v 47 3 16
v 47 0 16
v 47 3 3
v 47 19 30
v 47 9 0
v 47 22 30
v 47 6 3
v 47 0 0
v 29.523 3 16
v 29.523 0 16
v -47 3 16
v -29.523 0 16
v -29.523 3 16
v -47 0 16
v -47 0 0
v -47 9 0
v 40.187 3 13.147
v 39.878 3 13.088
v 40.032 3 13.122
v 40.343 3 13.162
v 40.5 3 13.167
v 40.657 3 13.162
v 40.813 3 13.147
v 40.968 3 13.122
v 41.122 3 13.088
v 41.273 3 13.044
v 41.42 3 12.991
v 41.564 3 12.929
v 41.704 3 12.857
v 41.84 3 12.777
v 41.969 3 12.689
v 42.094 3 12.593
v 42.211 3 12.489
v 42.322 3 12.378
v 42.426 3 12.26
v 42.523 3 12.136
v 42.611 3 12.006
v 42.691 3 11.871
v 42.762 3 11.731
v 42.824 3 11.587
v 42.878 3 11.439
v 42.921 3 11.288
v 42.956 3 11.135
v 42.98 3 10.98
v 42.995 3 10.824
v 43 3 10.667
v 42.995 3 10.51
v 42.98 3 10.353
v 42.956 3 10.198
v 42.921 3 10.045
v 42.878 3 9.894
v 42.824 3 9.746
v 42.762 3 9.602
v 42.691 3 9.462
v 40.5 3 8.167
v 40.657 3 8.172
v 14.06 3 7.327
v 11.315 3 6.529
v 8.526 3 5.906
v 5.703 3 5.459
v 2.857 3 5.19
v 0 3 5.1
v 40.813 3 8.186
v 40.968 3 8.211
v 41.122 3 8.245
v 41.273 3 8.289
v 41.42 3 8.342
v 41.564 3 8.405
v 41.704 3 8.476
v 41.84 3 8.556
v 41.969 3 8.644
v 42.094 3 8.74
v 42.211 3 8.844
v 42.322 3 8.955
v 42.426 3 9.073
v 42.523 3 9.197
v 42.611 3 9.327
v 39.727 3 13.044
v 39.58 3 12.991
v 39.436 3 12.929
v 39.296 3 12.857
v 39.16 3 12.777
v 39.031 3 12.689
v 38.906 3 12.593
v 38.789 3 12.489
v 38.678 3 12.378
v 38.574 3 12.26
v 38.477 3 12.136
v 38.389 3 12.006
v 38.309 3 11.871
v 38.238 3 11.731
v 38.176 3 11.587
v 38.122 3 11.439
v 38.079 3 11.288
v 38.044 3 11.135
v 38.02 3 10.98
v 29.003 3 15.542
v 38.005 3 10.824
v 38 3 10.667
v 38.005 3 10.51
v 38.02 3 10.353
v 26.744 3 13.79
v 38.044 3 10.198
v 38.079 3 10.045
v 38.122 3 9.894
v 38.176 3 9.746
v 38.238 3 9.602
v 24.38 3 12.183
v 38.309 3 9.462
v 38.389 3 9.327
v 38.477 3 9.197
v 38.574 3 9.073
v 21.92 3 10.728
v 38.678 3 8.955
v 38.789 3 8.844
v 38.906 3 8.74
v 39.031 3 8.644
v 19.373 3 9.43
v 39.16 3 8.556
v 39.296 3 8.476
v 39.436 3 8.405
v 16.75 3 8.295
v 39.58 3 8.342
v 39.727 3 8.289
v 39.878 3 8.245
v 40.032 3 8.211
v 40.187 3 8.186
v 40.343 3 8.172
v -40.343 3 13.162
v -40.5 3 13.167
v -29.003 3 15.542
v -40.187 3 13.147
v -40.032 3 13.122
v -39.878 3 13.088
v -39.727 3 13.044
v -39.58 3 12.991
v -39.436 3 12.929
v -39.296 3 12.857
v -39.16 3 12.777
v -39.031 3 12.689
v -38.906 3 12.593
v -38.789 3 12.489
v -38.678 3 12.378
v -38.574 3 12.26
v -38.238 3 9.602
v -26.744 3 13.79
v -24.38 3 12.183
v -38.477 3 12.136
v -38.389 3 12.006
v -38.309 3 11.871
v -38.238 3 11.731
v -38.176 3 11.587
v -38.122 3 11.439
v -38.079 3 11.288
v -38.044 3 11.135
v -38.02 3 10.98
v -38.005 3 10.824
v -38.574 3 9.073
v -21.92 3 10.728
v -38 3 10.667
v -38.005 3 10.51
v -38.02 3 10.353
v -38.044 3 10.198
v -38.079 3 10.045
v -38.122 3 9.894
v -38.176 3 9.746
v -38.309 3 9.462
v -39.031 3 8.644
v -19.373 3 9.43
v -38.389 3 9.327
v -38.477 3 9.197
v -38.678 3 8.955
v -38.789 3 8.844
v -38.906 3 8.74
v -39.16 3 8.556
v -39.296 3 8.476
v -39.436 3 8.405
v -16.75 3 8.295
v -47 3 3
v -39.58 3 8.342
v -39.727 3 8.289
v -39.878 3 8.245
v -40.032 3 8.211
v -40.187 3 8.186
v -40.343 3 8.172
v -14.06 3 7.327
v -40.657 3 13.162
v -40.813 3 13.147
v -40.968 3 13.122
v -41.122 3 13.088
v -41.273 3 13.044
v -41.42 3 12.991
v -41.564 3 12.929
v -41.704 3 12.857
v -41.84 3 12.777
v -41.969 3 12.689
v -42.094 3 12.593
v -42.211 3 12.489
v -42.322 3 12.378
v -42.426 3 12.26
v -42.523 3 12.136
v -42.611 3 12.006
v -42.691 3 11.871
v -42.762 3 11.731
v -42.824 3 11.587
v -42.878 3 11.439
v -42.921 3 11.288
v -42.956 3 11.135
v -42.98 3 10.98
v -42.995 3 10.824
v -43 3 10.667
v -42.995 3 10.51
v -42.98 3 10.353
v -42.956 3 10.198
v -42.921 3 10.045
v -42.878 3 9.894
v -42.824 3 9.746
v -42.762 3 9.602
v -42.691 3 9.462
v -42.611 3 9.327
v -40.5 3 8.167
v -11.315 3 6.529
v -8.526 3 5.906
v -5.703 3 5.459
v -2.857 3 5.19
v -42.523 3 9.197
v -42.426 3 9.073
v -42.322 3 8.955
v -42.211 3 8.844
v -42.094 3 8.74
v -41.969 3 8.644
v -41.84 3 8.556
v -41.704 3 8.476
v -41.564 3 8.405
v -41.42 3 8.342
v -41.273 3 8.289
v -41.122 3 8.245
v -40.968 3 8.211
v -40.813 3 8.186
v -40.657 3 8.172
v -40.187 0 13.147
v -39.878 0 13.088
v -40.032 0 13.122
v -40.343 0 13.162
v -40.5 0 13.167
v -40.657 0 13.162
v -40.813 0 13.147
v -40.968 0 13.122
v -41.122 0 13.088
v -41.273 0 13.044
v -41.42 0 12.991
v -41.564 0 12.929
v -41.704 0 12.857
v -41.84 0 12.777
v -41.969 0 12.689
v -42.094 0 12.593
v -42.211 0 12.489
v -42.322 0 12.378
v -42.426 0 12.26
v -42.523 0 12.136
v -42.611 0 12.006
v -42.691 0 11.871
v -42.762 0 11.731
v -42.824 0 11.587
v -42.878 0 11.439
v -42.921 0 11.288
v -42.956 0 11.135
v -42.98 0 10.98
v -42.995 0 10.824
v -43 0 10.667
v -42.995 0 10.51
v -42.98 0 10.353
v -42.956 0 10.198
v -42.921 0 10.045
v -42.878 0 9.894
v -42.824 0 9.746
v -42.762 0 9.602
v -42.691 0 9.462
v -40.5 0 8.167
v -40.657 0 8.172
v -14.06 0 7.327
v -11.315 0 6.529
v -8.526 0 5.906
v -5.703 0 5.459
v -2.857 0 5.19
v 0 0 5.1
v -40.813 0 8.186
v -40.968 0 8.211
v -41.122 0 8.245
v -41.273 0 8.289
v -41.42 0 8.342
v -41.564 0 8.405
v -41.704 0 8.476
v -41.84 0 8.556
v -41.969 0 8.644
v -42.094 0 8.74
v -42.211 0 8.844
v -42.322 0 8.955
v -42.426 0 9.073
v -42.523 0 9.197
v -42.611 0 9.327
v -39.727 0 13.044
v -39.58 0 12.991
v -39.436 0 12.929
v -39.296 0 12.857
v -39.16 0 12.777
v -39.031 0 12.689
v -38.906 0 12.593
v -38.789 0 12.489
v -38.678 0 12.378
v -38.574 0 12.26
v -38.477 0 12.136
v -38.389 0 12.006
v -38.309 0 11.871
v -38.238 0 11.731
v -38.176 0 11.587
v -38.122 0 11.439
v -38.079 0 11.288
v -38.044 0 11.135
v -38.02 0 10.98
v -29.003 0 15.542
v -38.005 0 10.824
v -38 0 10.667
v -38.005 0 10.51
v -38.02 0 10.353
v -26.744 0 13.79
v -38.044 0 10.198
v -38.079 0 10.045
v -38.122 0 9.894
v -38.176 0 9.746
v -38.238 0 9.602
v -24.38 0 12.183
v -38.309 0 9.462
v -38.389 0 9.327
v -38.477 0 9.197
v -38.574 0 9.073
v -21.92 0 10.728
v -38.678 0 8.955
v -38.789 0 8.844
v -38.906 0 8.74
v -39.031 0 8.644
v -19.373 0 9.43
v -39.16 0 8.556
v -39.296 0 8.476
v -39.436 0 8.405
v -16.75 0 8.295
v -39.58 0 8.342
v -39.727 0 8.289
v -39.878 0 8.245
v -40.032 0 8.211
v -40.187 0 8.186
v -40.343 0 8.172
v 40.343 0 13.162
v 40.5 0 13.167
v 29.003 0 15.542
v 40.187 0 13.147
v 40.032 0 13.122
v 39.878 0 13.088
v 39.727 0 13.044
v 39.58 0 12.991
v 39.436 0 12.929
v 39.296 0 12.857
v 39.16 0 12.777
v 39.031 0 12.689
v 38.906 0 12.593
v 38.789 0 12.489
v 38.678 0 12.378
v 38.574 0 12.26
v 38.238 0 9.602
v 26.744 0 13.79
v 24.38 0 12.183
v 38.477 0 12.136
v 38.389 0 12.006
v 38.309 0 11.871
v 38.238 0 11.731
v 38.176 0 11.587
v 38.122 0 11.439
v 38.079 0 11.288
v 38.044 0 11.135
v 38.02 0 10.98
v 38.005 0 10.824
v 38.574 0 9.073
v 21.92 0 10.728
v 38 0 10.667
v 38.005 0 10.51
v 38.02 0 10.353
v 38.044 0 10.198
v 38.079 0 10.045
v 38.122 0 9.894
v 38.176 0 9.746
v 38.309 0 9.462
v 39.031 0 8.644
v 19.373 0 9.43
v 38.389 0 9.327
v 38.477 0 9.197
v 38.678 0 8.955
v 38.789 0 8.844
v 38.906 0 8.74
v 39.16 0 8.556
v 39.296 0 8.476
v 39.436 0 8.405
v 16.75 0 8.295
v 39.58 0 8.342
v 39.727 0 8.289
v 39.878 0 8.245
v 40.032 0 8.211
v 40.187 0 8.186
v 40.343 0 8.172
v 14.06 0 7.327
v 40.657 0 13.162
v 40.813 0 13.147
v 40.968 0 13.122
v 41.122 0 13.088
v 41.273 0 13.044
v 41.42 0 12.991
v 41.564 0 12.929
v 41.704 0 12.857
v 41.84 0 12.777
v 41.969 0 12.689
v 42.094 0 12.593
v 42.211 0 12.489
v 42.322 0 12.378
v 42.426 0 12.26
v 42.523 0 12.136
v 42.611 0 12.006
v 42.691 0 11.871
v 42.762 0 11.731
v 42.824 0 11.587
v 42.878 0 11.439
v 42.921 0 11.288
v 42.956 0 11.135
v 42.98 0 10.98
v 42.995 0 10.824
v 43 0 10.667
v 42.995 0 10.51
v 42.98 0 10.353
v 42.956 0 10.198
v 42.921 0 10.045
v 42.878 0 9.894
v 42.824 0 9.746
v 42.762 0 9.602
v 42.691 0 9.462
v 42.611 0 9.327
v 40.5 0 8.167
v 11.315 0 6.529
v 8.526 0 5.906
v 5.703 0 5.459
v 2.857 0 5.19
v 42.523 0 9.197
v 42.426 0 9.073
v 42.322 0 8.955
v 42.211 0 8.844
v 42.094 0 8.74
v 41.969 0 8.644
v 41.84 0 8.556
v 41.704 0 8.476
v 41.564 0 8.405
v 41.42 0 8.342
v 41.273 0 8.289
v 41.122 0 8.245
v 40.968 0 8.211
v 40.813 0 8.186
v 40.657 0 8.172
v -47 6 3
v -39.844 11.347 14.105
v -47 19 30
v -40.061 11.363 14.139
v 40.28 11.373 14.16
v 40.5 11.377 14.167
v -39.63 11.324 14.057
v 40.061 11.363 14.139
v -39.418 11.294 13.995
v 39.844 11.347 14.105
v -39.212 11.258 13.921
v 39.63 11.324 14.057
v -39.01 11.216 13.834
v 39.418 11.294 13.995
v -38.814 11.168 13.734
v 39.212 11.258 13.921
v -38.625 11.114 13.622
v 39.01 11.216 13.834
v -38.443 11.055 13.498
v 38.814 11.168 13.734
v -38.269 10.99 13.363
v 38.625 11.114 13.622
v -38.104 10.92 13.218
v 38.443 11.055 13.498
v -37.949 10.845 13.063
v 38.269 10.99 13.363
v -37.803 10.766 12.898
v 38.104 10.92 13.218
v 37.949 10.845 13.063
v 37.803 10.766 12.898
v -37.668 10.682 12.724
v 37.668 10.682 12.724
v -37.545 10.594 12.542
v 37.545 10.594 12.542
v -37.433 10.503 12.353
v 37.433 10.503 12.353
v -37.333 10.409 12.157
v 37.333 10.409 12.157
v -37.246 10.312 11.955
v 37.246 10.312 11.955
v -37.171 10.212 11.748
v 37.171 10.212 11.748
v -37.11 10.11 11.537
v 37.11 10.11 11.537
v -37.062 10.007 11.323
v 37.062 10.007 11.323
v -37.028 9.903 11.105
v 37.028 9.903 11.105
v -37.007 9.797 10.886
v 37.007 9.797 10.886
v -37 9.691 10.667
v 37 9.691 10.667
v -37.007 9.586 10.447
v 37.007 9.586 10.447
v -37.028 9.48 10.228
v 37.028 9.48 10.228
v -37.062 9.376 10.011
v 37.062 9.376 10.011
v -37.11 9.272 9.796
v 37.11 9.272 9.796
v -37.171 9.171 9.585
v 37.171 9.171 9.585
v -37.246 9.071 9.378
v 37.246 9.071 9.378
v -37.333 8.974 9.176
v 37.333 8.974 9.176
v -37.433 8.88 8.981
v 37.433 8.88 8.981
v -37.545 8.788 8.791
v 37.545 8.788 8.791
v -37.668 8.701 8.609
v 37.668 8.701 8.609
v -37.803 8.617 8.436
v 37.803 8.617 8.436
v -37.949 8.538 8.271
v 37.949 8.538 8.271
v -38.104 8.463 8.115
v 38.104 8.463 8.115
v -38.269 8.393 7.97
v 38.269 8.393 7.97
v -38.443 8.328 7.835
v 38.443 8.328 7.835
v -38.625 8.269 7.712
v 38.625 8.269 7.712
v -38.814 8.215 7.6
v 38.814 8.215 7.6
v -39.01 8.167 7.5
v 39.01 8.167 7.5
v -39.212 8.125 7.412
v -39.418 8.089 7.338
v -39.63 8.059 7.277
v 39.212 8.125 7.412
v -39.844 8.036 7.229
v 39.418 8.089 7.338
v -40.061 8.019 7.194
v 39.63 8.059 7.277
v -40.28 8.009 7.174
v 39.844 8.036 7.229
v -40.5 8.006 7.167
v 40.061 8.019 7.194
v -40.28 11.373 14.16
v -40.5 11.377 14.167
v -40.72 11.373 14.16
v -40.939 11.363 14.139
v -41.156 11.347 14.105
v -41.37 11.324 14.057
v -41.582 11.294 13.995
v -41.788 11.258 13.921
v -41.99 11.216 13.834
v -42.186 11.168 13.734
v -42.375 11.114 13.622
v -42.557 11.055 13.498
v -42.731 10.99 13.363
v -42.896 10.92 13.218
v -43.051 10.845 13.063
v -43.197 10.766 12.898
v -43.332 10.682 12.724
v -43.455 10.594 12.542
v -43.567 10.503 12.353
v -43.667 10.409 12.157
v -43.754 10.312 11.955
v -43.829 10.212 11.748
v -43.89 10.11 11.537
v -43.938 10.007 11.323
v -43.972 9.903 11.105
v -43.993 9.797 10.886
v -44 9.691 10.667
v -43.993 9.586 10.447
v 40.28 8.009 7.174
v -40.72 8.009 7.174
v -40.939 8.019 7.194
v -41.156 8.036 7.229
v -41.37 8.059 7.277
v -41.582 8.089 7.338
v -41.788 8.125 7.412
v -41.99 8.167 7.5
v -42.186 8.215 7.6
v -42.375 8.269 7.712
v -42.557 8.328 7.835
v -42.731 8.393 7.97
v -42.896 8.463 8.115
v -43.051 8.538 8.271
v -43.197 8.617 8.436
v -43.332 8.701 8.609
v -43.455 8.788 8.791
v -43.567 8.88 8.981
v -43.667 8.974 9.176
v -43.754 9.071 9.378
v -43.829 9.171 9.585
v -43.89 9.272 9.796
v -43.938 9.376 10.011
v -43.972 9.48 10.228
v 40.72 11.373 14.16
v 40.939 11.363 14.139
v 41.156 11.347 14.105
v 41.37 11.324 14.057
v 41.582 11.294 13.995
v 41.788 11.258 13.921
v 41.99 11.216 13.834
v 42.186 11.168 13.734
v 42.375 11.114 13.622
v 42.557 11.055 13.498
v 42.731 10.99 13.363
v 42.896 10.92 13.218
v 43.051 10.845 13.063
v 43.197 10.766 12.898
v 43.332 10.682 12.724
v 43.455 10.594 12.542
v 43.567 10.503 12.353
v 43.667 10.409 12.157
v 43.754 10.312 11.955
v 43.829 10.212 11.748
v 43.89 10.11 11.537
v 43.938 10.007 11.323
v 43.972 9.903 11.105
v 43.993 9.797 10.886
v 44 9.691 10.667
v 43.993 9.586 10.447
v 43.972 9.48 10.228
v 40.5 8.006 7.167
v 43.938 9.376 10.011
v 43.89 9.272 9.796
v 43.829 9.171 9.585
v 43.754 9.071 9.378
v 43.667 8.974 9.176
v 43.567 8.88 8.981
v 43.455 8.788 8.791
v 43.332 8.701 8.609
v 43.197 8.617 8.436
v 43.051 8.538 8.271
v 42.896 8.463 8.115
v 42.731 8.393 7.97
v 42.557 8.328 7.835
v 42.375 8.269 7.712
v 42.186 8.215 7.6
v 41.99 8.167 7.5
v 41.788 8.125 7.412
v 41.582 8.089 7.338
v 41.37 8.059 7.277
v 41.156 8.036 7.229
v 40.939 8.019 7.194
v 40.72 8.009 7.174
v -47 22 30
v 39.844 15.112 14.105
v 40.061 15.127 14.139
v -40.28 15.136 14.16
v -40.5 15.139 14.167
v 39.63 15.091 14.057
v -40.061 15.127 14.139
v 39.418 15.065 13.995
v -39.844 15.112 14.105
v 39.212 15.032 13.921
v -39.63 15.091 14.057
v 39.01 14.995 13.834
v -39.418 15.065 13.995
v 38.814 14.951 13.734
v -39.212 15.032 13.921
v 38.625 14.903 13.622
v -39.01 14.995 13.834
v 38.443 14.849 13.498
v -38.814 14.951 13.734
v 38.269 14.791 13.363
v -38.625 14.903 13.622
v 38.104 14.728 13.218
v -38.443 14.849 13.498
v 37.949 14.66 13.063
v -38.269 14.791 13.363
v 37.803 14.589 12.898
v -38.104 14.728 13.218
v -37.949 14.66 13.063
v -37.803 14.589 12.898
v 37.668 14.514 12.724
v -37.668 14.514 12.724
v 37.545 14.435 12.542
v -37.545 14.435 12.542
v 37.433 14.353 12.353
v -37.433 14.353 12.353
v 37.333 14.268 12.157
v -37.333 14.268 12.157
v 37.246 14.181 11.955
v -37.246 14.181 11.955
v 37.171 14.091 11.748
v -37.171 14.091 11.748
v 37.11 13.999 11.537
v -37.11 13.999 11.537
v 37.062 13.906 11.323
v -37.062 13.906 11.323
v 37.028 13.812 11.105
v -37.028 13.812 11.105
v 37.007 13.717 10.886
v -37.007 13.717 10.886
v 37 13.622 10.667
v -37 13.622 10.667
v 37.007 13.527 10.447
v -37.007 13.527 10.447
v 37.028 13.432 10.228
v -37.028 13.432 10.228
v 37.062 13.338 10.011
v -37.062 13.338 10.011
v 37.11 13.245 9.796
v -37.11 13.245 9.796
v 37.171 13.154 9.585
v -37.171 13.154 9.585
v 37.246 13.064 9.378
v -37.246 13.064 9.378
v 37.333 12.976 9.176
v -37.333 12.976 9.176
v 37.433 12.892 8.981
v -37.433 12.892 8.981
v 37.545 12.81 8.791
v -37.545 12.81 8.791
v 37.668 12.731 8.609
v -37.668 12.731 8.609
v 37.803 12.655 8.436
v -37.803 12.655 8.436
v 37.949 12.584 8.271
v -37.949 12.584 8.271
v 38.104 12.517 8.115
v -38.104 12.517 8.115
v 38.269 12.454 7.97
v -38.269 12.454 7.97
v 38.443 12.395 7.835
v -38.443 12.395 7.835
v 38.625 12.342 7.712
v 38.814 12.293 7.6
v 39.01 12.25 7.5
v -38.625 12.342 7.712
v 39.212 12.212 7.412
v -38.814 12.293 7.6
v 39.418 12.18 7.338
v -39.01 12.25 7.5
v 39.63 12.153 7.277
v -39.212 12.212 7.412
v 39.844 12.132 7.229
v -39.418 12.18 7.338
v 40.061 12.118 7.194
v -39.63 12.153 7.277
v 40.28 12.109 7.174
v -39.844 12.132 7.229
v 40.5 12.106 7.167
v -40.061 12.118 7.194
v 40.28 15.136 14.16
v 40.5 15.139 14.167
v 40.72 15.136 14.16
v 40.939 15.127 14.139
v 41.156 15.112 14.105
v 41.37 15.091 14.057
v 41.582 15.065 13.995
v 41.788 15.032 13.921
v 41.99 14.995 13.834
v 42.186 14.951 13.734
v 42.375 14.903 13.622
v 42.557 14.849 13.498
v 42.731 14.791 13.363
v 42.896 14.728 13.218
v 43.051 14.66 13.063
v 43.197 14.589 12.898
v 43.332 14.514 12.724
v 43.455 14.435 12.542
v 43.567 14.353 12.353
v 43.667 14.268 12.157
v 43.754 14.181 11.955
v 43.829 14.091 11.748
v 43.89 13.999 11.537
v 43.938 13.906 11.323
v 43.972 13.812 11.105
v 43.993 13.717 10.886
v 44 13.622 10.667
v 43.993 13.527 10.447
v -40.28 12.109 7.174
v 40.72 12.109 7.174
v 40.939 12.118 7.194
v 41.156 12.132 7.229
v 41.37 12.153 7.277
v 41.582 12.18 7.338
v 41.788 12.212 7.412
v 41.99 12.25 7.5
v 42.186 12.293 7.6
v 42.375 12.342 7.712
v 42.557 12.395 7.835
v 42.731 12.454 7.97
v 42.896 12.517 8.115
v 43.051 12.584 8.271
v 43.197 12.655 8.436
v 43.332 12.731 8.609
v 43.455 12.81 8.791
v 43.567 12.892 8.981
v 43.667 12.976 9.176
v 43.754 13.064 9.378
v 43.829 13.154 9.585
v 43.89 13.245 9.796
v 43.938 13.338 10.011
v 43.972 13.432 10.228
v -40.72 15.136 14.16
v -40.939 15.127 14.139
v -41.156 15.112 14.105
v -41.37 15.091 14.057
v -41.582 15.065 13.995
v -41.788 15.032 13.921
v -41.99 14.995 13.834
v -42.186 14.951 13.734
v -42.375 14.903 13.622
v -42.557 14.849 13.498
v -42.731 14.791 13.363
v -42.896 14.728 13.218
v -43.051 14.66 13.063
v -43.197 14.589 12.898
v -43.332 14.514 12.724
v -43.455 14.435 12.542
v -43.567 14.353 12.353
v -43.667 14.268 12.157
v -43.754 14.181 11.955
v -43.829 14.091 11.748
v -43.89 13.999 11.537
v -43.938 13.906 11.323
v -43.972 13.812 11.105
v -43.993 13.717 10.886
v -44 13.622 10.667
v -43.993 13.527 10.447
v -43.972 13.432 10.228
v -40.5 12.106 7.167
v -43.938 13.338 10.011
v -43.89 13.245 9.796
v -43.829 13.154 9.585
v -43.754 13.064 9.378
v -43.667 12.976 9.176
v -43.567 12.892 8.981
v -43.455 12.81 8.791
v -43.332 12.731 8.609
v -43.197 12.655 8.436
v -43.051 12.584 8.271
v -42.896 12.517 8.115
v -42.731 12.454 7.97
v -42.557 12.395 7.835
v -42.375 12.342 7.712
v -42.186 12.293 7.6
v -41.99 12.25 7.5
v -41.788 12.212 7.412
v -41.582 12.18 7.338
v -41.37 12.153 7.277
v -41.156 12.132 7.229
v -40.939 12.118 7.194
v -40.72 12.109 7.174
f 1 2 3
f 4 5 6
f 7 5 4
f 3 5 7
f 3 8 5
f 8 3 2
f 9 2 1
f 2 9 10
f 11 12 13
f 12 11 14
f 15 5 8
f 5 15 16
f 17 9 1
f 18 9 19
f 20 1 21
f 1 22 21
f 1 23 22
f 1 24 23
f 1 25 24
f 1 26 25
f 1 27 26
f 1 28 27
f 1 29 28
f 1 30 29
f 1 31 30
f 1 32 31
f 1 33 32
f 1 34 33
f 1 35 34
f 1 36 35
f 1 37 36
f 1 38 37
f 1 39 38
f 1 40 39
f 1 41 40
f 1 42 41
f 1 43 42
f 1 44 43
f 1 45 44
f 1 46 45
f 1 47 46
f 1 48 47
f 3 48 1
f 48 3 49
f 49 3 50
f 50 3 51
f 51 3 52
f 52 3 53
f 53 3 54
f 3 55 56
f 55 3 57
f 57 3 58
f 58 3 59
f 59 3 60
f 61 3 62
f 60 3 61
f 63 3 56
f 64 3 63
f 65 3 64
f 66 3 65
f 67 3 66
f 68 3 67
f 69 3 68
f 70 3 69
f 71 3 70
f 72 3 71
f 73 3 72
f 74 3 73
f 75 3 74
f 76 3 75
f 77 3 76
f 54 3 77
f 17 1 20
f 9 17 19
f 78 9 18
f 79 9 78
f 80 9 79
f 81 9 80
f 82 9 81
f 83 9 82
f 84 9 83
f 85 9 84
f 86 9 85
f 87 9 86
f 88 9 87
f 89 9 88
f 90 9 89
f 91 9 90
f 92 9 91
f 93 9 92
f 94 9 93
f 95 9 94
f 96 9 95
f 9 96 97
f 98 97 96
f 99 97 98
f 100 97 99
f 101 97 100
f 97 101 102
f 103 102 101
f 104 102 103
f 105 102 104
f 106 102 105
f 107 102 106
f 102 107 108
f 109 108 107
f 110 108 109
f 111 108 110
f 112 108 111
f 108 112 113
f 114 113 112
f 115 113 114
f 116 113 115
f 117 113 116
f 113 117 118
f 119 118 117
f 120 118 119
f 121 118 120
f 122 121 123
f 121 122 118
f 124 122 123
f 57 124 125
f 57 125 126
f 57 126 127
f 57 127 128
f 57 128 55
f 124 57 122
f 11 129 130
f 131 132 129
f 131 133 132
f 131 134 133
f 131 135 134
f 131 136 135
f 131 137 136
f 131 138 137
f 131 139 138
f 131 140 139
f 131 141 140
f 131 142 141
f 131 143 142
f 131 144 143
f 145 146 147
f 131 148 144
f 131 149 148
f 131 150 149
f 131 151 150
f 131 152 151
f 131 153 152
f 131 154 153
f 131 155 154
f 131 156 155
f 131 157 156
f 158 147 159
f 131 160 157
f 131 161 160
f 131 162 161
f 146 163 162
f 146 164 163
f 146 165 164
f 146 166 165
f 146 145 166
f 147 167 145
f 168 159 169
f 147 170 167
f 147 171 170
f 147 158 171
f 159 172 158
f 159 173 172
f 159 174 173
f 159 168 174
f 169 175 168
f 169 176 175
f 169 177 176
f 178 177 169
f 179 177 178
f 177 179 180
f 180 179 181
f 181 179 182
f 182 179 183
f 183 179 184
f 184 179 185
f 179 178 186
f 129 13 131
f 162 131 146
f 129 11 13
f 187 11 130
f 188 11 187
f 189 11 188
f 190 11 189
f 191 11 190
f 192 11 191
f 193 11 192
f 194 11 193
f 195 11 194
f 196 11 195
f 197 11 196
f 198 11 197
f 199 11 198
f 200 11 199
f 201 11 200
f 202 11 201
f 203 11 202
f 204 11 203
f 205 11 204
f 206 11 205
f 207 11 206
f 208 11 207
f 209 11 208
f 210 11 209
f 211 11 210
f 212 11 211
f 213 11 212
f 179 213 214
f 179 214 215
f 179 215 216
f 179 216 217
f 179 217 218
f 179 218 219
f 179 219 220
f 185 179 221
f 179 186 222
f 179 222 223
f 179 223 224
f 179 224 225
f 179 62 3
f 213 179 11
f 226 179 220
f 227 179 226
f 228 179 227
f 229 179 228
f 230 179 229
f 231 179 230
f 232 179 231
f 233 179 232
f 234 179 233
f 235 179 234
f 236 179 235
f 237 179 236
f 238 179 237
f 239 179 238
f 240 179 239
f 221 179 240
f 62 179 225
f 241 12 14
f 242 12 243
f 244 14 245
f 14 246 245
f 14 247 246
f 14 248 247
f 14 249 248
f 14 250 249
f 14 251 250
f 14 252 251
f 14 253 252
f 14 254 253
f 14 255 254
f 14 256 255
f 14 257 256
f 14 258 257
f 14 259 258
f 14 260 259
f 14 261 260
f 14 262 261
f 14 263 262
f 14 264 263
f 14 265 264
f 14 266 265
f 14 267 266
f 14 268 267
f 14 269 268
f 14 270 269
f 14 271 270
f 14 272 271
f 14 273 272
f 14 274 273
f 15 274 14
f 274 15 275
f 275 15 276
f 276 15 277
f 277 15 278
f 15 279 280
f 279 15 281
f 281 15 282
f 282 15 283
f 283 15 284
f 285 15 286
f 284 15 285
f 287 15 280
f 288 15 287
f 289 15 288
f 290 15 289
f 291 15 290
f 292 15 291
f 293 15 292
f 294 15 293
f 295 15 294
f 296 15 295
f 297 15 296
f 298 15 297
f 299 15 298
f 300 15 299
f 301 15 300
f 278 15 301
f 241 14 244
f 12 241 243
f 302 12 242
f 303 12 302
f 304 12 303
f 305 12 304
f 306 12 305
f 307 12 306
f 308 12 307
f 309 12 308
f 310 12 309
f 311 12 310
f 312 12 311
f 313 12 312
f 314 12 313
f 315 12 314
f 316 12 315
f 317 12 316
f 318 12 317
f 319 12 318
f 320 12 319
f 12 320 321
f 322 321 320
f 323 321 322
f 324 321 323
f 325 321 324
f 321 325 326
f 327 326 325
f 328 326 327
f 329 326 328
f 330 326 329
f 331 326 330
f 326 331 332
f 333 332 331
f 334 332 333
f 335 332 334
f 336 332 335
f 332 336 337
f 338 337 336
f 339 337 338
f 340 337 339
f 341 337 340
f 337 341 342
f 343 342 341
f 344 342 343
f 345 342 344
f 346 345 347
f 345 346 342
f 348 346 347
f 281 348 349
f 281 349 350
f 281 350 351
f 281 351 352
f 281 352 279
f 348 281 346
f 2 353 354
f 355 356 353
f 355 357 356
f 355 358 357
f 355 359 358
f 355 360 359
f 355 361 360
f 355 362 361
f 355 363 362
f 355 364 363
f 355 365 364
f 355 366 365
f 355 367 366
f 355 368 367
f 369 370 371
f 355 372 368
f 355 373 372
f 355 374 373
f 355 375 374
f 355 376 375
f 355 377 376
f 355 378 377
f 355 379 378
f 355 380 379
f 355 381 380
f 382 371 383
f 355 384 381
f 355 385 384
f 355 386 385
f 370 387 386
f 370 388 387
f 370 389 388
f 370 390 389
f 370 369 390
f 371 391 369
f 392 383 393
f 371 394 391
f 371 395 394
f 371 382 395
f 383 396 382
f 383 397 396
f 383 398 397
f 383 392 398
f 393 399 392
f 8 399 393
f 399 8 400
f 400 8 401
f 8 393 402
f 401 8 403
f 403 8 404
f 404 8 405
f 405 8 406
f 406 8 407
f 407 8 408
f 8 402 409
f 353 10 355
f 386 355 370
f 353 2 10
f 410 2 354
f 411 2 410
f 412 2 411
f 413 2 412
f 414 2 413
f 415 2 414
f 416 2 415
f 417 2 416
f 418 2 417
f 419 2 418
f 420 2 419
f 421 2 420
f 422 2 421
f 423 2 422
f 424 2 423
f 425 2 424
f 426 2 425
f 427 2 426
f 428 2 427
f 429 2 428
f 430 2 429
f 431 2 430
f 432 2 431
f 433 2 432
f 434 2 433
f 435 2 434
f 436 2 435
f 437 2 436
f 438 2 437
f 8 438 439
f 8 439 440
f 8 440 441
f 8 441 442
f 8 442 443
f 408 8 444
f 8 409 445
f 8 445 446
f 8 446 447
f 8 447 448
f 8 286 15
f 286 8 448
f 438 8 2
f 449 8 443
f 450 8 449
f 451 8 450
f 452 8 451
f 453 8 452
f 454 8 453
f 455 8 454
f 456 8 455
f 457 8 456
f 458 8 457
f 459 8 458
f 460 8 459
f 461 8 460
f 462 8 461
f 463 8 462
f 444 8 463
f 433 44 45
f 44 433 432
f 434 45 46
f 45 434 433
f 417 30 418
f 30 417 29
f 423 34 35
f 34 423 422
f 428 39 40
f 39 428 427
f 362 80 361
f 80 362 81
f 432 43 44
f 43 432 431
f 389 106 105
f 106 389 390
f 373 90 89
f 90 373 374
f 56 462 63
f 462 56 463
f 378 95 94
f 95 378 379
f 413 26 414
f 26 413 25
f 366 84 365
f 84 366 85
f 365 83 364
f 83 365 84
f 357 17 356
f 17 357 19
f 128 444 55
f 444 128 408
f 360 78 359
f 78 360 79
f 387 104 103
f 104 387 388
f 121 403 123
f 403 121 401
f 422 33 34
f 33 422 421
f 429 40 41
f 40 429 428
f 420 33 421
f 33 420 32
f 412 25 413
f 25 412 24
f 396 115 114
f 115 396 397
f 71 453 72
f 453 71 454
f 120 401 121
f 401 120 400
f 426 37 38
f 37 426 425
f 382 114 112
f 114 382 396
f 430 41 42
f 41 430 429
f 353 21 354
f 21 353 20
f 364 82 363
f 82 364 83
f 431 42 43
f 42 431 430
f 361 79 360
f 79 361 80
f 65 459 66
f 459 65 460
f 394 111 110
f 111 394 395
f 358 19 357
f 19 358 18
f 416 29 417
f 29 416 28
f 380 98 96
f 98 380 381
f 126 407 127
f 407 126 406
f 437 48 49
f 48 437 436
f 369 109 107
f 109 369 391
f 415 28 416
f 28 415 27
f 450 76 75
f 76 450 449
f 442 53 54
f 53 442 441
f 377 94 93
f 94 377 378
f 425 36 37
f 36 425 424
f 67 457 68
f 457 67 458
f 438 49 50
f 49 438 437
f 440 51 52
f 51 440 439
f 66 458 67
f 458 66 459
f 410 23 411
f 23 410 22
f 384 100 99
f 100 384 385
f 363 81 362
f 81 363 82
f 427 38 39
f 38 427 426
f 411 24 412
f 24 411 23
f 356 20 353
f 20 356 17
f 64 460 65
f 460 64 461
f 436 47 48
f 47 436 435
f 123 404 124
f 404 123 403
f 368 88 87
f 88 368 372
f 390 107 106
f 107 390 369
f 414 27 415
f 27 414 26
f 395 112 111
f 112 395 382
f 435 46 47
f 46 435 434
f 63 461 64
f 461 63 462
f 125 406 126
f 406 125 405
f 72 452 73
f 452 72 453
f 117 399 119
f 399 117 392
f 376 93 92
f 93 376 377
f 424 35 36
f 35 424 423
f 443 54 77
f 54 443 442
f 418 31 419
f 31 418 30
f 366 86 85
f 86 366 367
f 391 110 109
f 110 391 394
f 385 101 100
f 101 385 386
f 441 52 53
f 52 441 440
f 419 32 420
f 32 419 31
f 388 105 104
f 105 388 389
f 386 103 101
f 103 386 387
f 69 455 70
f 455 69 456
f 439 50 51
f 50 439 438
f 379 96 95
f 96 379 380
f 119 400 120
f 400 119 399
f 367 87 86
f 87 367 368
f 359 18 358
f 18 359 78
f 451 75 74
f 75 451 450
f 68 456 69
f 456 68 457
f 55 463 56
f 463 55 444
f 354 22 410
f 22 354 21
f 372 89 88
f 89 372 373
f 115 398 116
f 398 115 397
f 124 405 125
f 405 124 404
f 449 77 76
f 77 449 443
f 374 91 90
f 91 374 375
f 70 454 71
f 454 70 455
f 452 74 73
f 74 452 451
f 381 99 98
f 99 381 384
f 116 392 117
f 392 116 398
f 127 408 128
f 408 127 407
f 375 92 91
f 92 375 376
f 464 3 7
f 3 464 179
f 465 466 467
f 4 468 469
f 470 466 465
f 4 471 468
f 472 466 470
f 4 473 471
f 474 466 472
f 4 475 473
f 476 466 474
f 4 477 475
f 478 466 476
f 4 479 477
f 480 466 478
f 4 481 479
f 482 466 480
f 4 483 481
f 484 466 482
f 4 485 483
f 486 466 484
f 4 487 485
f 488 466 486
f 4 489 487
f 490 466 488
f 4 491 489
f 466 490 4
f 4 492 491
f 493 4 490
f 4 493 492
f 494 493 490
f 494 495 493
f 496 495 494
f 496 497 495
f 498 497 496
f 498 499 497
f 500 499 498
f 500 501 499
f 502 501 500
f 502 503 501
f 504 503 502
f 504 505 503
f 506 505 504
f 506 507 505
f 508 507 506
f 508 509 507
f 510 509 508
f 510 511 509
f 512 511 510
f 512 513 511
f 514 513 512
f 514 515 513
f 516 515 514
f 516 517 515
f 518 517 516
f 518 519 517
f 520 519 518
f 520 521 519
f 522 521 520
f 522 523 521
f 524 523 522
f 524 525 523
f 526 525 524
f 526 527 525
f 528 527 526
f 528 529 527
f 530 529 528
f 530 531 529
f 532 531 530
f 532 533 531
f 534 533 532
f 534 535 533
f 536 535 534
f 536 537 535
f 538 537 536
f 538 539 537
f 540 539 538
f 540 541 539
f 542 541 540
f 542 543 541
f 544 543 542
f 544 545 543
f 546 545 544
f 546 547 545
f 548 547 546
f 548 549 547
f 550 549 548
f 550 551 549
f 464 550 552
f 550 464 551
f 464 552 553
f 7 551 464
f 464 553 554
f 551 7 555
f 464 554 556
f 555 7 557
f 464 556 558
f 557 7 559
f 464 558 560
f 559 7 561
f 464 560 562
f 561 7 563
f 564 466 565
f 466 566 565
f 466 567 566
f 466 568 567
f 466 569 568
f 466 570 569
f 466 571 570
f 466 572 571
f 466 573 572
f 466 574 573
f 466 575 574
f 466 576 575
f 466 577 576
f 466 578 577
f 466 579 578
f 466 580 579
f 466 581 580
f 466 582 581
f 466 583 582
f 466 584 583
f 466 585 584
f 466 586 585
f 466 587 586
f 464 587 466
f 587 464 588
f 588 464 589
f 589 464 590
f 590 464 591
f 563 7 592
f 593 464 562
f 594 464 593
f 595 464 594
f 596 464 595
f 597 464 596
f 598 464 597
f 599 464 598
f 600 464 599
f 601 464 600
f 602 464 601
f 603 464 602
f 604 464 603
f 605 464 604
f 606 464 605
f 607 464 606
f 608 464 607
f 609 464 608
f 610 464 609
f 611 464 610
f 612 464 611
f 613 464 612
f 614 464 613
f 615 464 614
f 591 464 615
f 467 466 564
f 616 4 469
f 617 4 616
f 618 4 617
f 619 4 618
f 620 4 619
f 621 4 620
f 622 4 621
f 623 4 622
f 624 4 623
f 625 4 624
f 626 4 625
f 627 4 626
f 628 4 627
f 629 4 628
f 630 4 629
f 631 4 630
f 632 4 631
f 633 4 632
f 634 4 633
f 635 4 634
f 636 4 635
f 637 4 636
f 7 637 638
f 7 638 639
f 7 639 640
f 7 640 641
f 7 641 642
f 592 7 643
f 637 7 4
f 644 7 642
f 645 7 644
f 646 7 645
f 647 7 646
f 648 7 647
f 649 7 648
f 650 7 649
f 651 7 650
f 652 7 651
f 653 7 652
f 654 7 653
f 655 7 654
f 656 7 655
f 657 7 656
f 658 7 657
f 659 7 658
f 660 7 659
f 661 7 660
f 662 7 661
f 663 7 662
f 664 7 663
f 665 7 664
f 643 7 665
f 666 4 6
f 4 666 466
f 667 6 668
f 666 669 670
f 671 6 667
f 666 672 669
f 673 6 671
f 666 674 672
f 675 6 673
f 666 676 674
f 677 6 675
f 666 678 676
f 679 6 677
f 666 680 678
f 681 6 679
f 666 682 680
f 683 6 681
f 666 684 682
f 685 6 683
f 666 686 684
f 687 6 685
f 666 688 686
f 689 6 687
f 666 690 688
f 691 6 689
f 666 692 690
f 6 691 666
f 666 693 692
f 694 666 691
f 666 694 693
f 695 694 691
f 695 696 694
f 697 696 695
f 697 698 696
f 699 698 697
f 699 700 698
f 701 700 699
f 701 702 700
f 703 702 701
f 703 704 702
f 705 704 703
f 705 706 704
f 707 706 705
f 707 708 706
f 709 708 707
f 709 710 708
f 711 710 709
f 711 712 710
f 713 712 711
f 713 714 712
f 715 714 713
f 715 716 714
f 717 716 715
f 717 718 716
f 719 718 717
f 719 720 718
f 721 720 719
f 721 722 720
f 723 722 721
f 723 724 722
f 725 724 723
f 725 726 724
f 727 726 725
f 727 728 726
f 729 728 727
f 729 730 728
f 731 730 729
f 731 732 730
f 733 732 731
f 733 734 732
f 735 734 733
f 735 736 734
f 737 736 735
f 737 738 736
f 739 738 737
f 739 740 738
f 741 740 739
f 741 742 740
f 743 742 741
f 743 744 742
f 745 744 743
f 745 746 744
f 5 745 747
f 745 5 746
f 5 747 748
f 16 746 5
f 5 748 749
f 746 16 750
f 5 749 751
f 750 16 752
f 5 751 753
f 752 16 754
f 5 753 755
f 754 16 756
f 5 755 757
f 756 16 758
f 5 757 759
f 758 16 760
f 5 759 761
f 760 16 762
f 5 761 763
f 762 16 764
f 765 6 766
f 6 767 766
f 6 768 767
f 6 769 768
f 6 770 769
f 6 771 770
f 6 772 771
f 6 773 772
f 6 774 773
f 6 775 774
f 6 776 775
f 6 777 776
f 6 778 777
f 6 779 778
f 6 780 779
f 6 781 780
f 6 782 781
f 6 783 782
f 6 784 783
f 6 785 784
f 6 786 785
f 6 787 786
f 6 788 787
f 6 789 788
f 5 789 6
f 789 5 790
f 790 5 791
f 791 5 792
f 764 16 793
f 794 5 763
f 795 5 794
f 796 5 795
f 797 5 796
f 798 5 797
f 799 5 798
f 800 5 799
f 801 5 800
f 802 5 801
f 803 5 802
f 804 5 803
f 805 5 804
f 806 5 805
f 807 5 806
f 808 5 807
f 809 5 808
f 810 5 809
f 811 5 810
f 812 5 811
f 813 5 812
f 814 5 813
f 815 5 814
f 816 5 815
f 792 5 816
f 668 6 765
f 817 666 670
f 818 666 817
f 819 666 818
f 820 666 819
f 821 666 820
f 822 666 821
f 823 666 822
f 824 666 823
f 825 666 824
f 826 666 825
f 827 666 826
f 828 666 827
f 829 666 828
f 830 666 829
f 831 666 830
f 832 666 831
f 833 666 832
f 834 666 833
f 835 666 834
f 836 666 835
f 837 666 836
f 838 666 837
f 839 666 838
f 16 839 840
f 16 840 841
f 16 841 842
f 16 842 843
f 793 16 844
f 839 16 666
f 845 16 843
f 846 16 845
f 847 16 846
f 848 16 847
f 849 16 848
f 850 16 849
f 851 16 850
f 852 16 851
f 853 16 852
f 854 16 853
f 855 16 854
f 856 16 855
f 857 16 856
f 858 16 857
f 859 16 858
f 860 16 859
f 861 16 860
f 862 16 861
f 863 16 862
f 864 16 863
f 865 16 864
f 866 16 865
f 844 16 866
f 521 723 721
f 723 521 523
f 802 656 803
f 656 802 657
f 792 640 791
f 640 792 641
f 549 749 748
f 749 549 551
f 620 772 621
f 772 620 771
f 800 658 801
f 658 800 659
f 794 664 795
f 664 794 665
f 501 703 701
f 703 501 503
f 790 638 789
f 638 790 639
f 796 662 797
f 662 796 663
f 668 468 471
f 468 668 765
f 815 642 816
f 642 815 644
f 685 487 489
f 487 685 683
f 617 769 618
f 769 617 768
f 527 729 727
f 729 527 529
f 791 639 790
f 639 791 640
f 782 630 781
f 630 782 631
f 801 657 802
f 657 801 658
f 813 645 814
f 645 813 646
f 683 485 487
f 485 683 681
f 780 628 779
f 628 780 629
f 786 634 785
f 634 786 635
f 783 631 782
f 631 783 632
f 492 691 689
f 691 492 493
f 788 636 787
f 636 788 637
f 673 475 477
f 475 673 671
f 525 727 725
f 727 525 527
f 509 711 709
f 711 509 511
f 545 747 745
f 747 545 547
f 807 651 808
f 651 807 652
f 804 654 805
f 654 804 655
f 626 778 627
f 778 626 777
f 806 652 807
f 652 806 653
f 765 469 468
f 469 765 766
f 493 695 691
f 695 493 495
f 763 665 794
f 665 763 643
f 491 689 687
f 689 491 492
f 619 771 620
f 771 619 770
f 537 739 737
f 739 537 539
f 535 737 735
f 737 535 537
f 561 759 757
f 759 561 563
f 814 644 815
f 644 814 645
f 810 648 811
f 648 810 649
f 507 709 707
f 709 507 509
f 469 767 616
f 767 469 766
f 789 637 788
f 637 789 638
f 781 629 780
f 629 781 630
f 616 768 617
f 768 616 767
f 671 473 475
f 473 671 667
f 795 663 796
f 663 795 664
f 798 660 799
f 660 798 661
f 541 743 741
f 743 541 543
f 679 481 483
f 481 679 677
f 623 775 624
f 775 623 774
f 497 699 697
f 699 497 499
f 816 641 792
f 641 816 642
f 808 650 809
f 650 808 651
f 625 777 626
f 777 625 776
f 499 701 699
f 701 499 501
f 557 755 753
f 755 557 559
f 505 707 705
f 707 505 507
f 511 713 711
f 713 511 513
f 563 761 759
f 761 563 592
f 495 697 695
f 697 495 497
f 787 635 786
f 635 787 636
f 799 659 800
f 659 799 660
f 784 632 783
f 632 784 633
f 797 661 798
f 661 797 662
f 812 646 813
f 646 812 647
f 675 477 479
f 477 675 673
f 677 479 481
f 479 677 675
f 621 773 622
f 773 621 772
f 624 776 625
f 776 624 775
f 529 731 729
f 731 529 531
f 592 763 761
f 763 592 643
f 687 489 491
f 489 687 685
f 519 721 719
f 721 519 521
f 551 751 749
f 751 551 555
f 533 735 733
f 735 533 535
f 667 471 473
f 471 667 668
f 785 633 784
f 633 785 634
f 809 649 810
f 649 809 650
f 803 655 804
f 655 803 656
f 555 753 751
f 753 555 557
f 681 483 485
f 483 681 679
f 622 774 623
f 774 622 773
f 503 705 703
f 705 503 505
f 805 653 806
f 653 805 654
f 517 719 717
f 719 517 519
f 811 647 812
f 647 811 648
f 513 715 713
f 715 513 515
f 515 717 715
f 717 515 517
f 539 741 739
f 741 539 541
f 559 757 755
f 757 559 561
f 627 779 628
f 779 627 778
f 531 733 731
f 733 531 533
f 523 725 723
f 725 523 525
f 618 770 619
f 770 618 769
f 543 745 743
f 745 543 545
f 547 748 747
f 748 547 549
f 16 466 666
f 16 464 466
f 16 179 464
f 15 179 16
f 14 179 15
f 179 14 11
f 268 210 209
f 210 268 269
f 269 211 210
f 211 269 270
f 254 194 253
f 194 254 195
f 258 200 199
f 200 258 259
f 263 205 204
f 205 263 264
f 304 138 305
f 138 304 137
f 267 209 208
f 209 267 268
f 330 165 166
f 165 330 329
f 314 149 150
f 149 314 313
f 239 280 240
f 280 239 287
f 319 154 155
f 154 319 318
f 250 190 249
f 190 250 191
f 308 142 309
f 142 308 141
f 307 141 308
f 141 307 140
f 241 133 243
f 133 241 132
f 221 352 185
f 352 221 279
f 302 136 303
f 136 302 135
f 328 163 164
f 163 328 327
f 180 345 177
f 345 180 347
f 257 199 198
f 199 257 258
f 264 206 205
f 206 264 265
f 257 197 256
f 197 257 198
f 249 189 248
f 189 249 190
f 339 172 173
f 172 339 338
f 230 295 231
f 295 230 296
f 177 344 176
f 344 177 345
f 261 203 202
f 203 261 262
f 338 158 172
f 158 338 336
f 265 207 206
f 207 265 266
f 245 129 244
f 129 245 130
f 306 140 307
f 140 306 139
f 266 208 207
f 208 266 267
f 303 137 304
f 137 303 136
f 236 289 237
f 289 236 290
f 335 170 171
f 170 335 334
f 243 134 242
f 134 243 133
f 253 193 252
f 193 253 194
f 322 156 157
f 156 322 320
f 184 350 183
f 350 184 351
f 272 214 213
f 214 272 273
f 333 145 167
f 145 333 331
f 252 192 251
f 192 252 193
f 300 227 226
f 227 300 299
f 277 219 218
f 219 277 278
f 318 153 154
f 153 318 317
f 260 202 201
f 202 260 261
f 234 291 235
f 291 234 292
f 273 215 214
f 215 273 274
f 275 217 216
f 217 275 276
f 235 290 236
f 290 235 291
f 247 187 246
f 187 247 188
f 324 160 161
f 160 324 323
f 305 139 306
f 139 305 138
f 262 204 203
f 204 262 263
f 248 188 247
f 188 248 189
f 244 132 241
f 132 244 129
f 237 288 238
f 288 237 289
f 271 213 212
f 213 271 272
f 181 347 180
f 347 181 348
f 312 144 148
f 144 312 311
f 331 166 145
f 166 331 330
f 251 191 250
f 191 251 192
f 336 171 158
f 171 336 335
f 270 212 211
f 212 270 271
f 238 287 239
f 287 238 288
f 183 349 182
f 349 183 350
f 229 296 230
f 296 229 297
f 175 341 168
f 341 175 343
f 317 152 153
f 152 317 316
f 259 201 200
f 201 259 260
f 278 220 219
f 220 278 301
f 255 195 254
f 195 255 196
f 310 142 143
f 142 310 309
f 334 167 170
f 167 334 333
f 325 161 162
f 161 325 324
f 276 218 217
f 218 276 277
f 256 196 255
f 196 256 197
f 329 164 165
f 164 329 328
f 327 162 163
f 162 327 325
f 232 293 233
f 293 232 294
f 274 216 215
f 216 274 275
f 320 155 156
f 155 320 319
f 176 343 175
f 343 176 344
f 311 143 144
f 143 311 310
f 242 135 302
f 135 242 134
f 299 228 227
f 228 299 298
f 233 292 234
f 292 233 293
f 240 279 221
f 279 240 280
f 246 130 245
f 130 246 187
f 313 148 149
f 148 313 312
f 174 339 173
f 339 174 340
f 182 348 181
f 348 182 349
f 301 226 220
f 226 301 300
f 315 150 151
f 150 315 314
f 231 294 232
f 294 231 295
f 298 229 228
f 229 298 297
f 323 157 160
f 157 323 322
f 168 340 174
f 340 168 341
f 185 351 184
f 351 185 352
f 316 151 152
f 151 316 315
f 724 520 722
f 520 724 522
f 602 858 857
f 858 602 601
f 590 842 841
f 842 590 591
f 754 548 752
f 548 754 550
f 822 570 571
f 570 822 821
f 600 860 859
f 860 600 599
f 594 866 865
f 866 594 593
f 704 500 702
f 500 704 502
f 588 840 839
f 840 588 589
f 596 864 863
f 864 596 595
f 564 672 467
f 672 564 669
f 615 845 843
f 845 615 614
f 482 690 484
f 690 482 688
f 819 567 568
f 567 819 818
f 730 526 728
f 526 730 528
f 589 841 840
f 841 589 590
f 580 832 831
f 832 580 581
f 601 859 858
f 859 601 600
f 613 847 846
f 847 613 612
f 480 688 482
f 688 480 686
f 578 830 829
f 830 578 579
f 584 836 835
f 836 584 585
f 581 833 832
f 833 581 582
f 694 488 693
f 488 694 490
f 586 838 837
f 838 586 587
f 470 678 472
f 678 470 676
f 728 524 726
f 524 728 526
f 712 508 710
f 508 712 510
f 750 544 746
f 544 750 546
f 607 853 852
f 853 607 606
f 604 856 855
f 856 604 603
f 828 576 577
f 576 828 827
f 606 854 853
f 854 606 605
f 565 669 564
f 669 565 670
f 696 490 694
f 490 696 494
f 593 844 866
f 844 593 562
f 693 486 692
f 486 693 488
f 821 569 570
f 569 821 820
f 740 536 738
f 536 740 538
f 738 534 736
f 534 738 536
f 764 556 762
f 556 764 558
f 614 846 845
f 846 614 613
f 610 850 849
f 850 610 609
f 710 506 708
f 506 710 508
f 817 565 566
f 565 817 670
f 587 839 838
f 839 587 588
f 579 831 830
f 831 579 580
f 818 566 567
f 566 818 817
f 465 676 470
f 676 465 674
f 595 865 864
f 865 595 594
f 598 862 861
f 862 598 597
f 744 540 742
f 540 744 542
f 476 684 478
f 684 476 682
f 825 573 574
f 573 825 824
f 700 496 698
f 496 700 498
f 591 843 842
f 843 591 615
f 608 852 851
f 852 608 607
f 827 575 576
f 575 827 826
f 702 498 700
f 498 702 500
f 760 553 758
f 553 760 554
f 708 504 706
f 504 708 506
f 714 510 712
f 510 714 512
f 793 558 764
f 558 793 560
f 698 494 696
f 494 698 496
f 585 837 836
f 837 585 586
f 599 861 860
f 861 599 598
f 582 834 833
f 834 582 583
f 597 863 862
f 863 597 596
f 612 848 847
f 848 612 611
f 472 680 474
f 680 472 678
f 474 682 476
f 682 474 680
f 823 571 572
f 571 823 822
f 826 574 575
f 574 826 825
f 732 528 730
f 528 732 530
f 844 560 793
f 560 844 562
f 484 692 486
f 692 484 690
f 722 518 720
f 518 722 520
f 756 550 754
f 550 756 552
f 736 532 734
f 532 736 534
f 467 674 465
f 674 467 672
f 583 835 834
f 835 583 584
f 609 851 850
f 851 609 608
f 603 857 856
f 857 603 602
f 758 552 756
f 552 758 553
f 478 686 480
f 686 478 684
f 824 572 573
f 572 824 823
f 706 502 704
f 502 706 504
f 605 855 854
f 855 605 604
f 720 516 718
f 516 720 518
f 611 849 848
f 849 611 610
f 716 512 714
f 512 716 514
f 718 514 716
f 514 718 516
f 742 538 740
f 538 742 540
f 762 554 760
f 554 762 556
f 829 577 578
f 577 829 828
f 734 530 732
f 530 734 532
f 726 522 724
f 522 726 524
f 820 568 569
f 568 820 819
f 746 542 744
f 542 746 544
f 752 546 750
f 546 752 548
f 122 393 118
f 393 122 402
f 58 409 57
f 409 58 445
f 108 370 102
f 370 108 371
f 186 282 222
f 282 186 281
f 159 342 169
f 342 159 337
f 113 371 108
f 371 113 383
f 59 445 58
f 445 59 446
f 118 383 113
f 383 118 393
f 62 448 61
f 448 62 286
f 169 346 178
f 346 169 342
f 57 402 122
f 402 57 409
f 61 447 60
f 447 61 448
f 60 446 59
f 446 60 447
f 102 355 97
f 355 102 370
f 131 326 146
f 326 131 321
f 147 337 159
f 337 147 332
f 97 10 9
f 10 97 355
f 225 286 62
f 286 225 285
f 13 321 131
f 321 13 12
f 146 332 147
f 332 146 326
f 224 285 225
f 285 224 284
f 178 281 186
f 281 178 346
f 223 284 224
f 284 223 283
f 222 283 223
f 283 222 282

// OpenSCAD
// [FL_INDEX: keywords="openscad, 3d_parametric, Configurable_fan_mounted_air_deflector, csg_solid" | COT="Parametric OpenSCAD design from 3DCodeverse"]
// Title: Configurable fan mounted air deflector

// Thickness of part surfaces. 3mm will give a robust part.
thickness = 3;
// Distance in mm that fin will go away from the fan.
fin_height = 22;
// Distance in mm between tilt section and mounting section.
spacer = 3;
// Distance into the fan that the fin tilts inward towards the fan.
fin_tilt = 30; // [0:50]
// The center-to-center distance between fan mounting holes, used for sizing the fan mount plate.
fan_mounting_hole_seperation = 81;
// Size of hole for the chassis mount screw.
fan_screw_hole_diameter = 5;
// Diameter in mm of your screw or screwdriver, whichever is larger. Or zero if you can mount from the other side.
access_hole_diameter = 7;

module fan_stand(thickness, space, height, tilt, fan_hole_sep)
{
	// Calculate sizes of parts (some calculations are done below).
	fan_dia = fan_mounting_hole_seperation + 2*fan_screw_hole_diameter;
	// These two are overridden below because OpenSCAD can't assign
	// values inside conditionals.
	mount_width = 2 * fan_screw_hole_diameter + 2 * thickness;
	width = fan_dia/2+thickness/2;

	// =============================== //
	// Fin
	// =============================== //

	module fin(screw_height) {
		adjusted_fin_height = height - space - thickness*2;
		difference() {
			union() {
				// spacer
				translate([0, thickness, 0])
				cube([width, spacer, thickness]);

				// fin
				translate([0, thickness+space, 0])
				rotate([0,90,0])
				linear_extrude(height=width) {
					// Trapazoidal polygon.
					polygon(points=[[0, thickness], [0, 0], [-thickness, 0],
						[-tilt, adjusted_fin_height], [-tilt, adjusted_fin_height+thickness]]);
				}
			}

			// Cut access hole for fan mount screw
			translate([fan_hole_sep/2, 2*thickness + height,screw_height]) 
			rotate([90,0,0])
			cylinder(h=height+2, r=access_hole_diameter/2, center = false, $fn=100);
		}


	}

	// =============================== //

	module fan_mount(x, y, z, screw_height) {
		difference() {
			cube([x, y, z]);

			// Cut fan mount screw hole
			translate([fan_hole_sep/2, thickness+1, screw_height]) 
			rotate([90,0,0])
			cylinder(h=thickness+2, r=fan_screw_hole_diameter/2, center = false, $fn=100);
		}
	}

	// =============================== //
	// Assembly
	// =============================== //

	module half_of_mount() {
		// Create half
		union() {
			// Fan mount (conditional accounts for small screw hole).
			if (mount_width < thickness) {
				fan_mount(width, thickness, thickness*3, z/3 * 2);
				fin(z/3 * 2);
			} else {
				fan_mount(width, thickness, mount_width, mount_width/3*2);
				fin(mount_width/3 * 2);
			}				
		}
	}

	// Create and join both halves.
	module complete_mount() {
		union() {
			// First half
			half_of_mount();

			// Second half
			mirror([1, 0, 0])
			half_of_mount();
		}
	}

	// Create mount and cut out the air hole.
	difference() {
		complete_mount();

		// Air cutout
		translate([0, thickness*1.5, fan_dia/2 + thickness*1.7]) rotate([90,0,0])
		cylinder(h=thickness*3, r=fan_dia/2, center = false, $fn=100);
	}
}

fan_stand(thickness, spacer, fin_height, fin_tilt, fan_mounting_hole_seperation);
